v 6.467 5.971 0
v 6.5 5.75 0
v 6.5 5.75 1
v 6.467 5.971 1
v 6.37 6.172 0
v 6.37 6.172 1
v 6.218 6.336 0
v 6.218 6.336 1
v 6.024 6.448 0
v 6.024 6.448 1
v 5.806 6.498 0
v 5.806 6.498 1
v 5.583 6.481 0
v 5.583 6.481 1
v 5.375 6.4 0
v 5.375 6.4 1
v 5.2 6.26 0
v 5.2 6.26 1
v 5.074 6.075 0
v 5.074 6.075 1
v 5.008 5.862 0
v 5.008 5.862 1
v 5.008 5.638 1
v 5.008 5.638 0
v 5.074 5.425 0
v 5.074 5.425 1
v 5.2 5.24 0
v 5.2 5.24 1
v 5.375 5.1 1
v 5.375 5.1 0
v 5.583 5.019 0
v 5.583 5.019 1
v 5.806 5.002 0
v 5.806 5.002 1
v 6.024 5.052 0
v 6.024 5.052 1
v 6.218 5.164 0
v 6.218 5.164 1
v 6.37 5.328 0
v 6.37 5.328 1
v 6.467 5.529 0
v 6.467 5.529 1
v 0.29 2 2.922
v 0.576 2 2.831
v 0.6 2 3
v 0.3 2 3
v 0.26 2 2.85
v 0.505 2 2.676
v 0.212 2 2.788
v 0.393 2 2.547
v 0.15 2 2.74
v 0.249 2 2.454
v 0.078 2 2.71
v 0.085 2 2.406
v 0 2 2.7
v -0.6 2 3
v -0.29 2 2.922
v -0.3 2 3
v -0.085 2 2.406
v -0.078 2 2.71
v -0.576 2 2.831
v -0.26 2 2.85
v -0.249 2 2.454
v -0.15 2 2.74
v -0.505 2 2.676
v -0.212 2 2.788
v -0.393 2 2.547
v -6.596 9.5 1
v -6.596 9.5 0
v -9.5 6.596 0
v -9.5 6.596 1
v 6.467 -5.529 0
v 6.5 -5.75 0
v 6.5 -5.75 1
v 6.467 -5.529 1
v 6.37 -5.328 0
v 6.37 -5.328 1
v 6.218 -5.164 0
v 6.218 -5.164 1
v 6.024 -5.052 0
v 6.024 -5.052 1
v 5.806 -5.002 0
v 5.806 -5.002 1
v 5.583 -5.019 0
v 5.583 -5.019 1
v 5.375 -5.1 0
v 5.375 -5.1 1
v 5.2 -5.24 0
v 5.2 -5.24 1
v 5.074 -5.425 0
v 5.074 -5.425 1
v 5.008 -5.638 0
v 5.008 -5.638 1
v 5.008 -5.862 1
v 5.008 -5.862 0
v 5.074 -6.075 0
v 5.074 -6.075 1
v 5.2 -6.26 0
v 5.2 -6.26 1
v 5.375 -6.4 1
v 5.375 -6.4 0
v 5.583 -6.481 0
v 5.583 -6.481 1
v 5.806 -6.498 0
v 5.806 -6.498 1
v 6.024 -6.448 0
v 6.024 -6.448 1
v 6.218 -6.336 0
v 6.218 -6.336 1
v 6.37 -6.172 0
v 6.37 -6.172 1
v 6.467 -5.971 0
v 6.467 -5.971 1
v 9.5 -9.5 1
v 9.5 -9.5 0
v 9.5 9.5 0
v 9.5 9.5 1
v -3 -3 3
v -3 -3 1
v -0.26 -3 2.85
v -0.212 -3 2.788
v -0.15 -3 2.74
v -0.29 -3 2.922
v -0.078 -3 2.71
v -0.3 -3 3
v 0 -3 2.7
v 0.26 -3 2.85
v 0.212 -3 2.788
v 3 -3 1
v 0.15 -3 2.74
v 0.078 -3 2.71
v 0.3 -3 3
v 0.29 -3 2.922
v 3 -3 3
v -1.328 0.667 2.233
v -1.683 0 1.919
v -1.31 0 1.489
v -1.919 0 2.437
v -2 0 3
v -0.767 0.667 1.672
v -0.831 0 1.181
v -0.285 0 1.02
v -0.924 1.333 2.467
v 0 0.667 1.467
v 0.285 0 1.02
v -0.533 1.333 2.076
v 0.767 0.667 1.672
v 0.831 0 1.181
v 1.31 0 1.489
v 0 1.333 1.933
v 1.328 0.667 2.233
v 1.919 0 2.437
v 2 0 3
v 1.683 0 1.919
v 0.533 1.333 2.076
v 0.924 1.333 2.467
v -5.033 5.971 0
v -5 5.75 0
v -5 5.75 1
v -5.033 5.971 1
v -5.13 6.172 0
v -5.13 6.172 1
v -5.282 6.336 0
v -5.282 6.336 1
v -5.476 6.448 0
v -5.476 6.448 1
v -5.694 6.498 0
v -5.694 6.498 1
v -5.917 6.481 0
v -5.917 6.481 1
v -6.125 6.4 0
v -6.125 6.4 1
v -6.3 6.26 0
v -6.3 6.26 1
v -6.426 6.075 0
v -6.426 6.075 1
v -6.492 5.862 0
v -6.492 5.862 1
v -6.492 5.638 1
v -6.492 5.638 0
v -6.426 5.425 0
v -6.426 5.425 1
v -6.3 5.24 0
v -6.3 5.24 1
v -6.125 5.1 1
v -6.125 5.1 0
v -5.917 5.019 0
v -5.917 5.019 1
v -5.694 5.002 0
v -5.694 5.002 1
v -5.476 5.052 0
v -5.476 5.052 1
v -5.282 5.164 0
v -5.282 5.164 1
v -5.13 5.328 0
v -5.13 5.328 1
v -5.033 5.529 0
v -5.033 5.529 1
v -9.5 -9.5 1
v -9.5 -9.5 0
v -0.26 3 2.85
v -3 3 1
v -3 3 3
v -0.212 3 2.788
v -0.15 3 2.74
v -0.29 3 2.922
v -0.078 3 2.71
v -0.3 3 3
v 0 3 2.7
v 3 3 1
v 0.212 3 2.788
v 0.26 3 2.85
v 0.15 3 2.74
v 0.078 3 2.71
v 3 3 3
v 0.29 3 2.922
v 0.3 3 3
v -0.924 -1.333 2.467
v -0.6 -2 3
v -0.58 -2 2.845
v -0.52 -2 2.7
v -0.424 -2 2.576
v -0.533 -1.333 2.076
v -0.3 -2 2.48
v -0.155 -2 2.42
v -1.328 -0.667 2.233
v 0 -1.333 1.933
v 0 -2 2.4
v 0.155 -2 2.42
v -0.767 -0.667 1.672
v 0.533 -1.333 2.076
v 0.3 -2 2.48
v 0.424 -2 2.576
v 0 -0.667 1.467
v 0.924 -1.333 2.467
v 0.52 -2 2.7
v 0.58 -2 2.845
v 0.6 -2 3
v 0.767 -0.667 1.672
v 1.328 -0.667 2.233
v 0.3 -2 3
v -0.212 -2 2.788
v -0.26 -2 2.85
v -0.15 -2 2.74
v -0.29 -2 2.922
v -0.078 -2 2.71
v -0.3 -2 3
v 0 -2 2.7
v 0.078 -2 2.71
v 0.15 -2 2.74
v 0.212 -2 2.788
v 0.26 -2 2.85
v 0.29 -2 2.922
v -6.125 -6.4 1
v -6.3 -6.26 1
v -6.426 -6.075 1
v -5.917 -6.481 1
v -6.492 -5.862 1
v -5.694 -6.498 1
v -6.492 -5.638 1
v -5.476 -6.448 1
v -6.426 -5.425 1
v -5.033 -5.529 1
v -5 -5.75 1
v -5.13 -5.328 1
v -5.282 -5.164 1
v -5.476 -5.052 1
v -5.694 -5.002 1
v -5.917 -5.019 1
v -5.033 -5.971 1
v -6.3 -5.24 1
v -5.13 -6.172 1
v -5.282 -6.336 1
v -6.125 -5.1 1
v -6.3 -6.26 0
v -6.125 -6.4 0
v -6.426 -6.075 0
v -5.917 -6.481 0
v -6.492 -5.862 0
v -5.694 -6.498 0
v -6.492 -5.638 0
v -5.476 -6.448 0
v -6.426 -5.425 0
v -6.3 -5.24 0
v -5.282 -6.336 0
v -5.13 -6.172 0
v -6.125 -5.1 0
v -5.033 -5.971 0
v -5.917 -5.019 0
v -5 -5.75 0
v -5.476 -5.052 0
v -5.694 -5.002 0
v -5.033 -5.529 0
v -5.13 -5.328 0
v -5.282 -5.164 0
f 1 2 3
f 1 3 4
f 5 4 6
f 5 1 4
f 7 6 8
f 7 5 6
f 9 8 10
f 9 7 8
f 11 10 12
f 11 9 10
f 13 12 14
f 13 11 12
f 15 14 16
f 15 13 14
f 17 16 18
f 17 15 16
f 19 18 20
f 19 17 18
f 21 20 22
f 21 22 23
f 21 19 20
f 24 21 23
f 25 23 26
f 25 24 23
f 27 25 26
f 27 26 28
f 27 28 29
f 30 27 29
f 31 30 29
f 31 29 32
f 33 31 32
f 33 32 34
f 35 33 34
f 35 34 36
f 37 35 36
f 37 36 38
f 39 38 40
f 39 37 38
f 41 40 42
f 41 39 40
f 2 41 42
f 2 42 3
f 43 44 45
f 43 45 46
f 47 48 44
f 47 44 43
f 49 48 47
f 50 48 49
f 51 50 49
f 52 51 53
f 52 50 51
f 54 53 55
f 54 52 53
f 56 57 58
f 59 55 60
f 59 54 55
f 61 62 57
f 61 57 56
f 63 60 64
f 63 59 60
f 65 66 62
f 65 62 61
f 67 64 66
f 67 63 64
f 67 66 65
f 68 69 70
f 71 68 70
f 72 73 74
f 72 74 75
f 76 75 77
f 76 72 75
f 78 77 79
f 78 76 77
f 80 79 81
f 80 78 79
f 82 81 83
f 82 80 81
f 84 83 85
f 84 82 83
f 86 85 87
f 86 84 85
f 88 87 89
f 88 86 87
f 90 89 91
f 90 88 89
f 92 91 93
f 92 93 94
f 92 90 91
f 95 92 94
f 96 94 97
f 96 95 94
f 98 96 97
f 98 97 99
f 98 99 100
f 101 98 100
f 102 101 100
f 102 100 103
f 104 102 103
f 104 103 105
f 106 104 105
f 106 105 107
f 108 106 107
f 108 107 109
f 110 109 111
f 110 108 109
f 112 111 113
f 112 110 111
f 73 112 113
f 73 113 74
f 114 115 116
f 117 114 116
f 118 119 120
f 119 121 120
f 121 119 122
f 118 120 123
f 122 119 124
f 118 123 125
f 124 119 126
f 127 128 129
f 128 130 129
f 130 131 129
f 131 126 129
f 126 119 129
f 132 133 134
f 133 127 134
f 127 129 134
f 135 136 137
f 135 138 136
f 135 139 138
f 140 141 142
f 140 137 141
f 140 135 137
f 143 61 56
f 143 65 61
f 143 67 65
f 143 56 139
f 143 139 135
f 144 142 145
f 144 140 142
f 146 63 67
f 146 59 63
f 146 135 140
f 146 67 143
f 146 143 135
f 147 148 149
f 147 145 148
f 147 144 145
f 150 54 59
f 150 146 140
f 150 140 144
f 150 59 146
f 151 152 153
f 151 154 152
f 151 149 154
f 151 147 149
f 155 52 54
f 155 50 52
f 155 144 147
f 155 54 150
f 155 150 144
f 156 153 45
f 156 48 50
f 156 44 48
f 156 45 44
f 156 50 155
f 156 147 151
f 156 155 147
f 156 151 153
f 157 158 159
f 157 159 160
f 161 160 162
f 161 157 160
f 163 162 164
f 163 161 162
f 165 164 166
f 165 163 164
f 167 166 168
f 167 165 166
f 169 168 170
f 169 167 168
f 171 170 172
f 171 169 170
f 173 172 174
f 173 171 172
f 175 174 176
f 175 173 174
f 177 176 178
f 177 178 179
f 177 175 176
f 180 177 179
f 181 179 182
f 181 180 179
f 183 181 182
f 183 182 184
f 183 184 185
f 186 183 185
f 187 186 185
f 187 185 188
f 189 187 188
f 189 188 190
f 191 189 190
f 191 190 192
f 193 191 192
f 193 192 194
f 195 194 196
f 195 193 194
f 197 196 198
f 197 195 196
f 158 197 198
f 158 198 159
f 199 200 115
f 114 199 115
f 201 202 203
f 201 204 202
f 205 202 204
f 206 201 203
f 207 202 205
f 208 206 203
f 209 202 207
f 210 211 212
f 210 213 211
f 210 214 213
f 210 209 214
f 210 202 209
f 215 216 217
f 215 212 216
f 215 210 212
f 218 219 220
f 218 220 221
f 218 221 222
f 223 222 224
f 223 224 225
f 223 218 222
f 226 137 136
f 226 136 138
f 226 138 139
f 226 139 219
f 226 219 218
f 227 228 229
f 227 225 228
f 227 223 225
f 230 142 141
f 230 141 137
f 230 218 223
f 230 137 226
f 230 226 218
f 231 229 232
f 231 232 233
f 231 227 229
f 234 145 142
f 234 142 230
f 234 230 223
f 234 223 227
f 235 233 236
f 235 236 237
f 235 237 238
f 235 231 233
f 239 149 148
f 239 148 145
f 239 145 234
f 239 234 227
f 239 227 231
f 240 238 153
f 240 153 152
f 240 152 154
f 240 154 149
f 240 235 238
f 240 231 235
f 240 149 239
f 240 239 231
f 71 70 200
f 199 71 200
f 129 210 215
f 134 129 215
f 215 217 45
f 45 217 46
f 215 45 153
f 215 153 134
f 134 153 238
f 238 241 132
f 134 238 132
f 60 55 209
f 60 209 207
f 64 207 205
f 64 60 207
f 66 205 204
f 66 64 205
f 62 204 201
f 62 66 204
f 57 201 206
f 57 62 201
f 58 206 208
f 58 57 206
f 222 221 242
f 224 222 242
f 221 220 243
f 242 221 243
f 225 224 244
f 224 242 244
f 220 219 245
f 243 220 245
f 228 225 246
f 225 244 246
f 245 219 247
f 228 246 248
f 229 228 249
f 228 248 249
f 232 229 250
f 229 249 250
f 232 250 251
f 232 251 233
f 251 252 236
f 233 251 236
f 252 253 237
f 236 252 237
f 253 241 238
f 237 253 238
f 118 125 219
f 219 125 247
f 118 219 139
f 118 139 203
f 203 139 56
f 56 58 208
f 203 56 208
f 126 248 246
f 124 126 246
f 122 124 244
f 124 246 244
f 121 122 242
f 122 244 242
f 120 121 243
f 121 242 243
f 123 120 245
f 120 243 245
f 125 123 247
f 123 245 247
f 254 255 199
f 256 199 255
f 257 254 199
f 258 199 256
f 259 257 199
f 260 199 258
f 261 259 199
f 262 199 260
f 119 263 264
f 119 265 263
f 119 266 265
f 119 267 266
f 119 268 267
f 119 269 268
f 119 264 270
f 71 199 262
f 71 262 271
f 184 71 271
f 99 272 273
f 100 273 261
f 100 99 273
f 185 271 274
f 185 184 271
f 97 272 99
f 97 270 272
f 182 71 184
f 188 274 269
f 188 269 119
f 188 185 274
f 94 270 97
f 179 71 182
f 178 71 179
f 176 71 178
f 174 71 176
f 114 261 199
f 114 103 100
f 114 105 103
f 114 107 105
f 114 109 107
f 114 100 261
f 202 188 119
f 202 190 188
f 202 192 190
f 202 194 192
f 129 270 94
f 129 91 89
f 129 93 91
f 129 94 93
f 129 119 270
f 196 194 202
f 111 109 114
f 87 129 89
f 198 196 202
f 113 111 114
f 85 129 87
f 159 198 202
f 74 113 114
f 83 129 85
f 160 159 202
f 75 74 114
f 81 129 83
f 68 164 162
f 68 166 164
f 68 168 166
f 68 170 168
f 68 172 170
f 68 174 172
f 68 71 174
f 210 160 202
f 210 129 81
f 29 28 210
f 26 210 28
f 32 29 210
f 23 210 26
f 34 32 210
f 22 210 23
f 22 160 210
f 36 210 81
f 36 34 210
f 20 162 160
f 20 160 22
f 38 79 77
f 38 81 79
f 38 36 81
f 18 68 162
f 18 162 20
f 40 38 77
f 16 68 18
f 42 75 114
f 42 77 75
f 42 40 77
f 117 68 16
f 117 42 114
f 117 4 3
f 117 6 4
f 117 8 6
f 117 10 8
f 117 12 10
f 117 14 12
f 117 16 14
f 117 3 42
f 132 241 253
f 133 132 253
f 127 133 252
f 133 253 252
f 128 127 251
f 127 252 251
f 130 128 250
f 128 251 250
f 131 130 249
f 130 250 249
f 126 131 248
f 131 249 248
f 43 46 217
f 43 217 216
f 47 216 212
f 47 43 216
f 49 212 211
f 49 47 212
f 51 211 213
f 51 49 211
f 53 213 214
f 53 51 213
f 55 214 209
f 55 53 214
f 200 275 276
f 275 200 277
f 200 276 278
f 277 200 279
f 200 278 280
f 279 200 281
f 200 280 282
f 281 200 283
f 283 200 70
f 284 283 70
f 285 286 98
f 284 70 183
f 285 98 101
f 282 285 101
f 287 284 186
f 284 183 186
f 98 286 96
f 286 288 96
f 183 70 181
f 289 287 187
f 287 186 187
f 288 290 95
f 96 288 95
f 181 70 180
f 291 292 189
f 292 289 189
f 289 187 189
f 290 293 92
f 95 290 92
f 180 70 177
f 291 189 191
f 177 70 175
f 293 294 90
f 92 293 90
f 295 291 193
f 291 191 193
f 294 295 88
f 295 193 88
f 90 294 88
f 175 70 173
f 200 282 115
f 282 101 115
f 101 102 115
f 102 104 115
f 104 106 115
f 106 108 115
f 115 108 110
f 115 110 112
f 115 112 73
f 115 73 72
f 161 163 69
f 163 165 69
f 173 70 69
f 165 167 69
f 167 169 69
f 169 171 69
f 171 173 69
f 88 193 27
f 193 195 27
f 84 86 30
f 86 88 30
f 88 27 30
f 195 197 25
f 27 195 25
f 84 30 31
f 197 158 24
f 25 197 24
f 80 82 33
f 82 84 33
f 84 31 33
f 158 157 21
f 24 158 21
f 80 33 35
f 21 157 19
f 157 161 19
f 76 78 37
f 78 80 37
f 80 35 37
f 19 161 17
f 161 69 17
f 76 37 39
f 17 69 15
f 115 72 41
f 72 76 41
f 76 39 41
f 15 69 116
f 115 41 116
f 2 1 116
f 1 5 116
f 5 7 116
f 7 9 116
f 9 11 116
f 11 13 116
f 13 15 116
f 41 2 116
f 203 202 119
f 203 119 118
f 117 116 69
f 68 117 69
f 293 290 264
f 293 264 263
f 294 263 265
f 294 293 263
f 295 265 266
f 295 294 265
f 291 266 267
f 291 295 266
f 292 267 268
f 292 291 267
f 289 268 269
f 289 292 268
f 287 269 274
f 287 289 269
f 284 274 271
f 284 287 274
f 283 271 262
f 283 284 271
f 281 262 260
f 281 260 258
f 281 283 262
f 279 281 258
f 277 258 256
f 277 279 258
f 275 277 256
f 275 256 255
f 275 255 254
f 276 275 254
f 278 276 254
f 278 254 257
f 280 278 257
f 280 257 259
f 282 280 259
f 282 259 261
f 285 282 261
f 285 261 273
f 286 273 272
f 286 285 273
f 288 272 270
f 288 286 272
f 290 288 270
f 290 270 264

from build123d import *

# Parameters (mm, degrees)
F2_DEPTH  = 3
F0_W      = 0.3
F0_H      = 4
F3_DEPTH  = 3
F4_DEPTH  = 3
F7_DEPTH  = 3
F8_DEPTH  = 2
F9_DEPTH  = 1
F11_DEPTH = 3
F12_DEPTH = 2
F13_DEPTH = 1
F15_DEPTH = 1
F16_DEPTH = 1
F0_R      = 0.75
F17_DEPTH = 1


with BuildPart() as f2:
    # F0 (on Top) → F2 (new body)
    with BuildSketch(Plane.XY):
        Polygon((-0.6, -2), (-2, 0), (-2, -2), align=None)
    extrude(amount=F2_DEPTH)


with BuildPart() as f2b:
    # F0 (on Top) → F2, piece 2 (new body)
    with BuildSketch(Plane.XY):
        Polygon((-0.6, 2), (-2, 2), (-2, 0), align=None)
    extrude(amount=F2_DEPTH)


with BuildPart() as f2c:
    # F0 (on Top) → F2, piece 3 (new body)
    with BuildSketch(Plane.XY):
        Polygon((2, 2), (0.6, 2), (2, 0), align=None)
    extrude(amount=F2_DEPTH)


with BuildPart() as f2d:
    # F0 (on Top) → F2, piece 4 (new body)
    with BuildSketch(Plane.XY):
        Polygon((2, -2), (2, 0), (0.6, -2), align=None)
    extrude(amount=F2_DEPTH)


with BuildPart() as f3:
    # F0 (on Top) → F3 (new body)
    with BuildSketch(Plane.XY):
        Polygon((-0.6, -2), (-0.6, 2), (-2, 0), align=None)
        with Locations((-0.45, 0)):
            Rectangle(F0_W, F0_H)
        with Locations((-0.15, 0)):
            Rectangle(F0_W, F0_H)
    extrude(amount=F3_DEPTH)


with BuildPart() as f4:
    # F0 (on Top) → F4 (new body)
    with BuildSketch(Plane.XY):
        with Locations((0.45, 0)):
            Rectangle(F0_W, F0_H)
        Polygon((2, 0), (0.6, 2), (0.6, -2), align=None)
        with Locations((0.15, 0)):
            Rectangle(F0_W, F0_H)
    extrude(amount=F4_DEPTH)


with BuildPart() as f5_tool:
    # F4_face (on face) → F5 (revolve)
    with BuildSketch(Plane(origin=(0.7128205128, 0, 3), x_dir=(1, 0, 0), z_dir=(0, 0, 1))):
        Polygon((-0.1128205128, -2), (1.2871794872, 0), (-0.1128205128, 2), (-0.7128205128, 2), (-0.7128205128, -2), align=None)
    revolve(axis=Axis((0, 0, 3), (0, -1, 0)))


with BuildPart() as f3_1:
    add(f3.part)

    # F5: cut by f5_tool
    add(f5_tool.part, mode=Mode.SUBTRACT)


with BuildPart() as f4_1:
    add(f4.part)

    # F5: cut by f5_tool
    add(f5_tool.part, mode=Mode.SUBTRACT)


with BuildPart() as f2b_1:
    add(f2b.part)

    # F6: union F2, F3, F4, F2c, F2d
    add(f2.part)
    add(f3_1.part)
    add(f4_1.part)
    add(f2c.part)
    add(f2d.part)


with BuildPart() as f7:
    # F1 (on Front) → F7 (new body)
    with BuildSketch(Plane.XZ):
        with BuildLine():
            ThreePointArc((-0.6, 3), (-0.4242640687, 2.5757359313), (0, 2.4))
            Line((0, 2.4), (0, 2.7))
            ThreePointArc((0, 2.7), (-0.2121320344, 2.7878679656), (-0.3, 3))
            Line((-0.3, 3), (-0.6, 3))
        make_face()
        with BuildLine():
            Line((0, 2.7), (0, 2.4))
            ThreePointArc((0, 2.4), (0.4242640687, 2.5757359313), (0.6, 3))
            Line((0.6, 3), (0.3, 3))
            ThreePointArc((0.3, 3), (0.2121320344, 2.7878679656), (0, 2.7))
        make_face()
    extrude(amount=F7_DEPTH)

    # F1 (on Front) → F8 (cut)
    with BuildSketch(Plane.XZ):
        with BuildLine():
            ThreePointArc((-0.6, 3), (-0.4242640687, 2.5757359313), (0, 2.4))
            Line((0, 2.4), (0, 2.7))
            ThreePointArc((0, 2.7), (-0.2121320344, 2.7878679656), (-0.3, 3))
            Line((-0.3, 3), (-0.6, 3))
        make_face()
        with BuildLine():
            Line((0, 2.7), (0, 2.4))
            ThreePointArc((0, 2.4), (0.4242640687, 2.5757359313), (0.6, 3))
            Line((0.6, 3), (0.3, 3))
            ThreePointArc((0.3, 3), (0.2121320344, 2.7878679656), (0, 2.7))
        make_face()
    extrude(amount=F8_DEPTH, mode=Mode.SUBTRACT)


with BuildPart() as f9:
    # F9 (new): a face of the model
    f9_faces = [f2b_1.part.faces().sort_by_distance(p)[0] for p in [
        (0, -2, 1.4384118942),
    ]]
    extrude(f9_faces, amount=F9_DEPTH)


with BuildPart() as f7_1:
    add(f7.part)

    # F10: union F2b, F9
    add(f2b_1.part)
    add(f9.part)


with BuildPart() as f11:
    # F1 (on Front) → F11 (new body)
    with BuildSketch(Plane.XZ):
        with BuildLine():
            Line((0, 2.7), (0, 2.4))
            ThreePointArc((0, 2.4), (0.4242640687, 2.5757359313), (0.6, 3))
            Line((0.6, 3), (0.3, 3))
            ThreePointArc((0.3, 3), (0.2121320344, 2.7878679656), (0, 2.7))
        make_face()
        with BuildLine():
            ThreePointArc((-0.6, 3), (-0.4242640687, 2.5757359313), (0, 2.4))
            Line((0, 2.4), (0, 2.7))
            ThreePointArc((0, 2.7), (-0.2121320344, 2.7878679656), (-0.3, 3))
            Line((-0.3, 3), (-0.6, 3))
        make_face()
    extrude(amount=-F11_DEPTH)

    # F1 (on Front) → F12 (cut)
    with BuildSketch(Plane.XZ):
        with BuildLine():
            Line((0, 2.7), (0, 2.4))
            ThreePointArc((0, 2.4), (0.4242640687, 2.5757359313), (0.6, 3))
            Line((0.6, 3), (0.3, 3))
            ThreePointArc((0.3, 3), (0.2121320344, 2.7878679656), (0, 2.7))
        make_face()
        with BuildLine():
            ThreePointArc((-0.6, 3), (-0.4242640687, 2.5757359313), (0, 2.4))
            Line((0, 2.4), (0, 2.7))
            ThreePointArc((0, 2.7), (-0.2121320344, 2.7878679656), (-0.3, 3))
            Line((-0.3, 3), (-0.6, 3))
        make_face()
    extrude(amount=-F12_DEPTH, mode=Mode.SUBTRACT)


with BuildPart() as f13:
    # F13 (new): a face of the model
    f13_faces = [f7_1.part.faces().sort_by_distance(p)[0] for p in [
        (0, 2, 1.4384118942),
    ]]
    extrude(f13_faces, amount=F13_DEPTH)


with BuildPart() as f11_1:
    add(f11.part)

    # F14: union F13, F7
    add(f13.part)
    add(f7_1.part)

    # F15 (add): a face of the model
    f15_faces = [f11_1.faces().sort_by_distance(p)[0] for p in [
        (2, 0, 1.5),
    ]]
    extrude(f15_faces, amount=F15_DEPTH)

    # F16 (add): a face of the model
    f16_faces = [f11_1.faces().sort_by_distance(p)[0] for p in [
        (-2, 0, 1.5),
    ]]
    extrude(f16_faces, amount=F16_DEPTH)

    # F0 (on Top) → F17 (join)
    with BuildSketch(Plane.XY):
        Polygon((9.5, 9.5), (-6.5961940777, 9.5), (-9.5, 6.5961940777), (-9.5, -9.5), (9.5, -9.5), align=None)
        with Locations((-5.75, -5.75)):
            Circle(F0_R, mode=Mode.SUBTRACT)
        with Locations((5.75, -5.75)):
            Circle(F0_R, mode=Mode.SUBTRACT)
        with Locations((-5.75, 5.75)):
            Circle(F0_R, mode=Mode.SUBTRACT)
        Polygon((-2, 0), (-2, 2), (-0.6, 2), (-0.3, 2), (0, 2), (0.3, 2), (0.6, 2), (2, 2), (2, 0), (2, -2), (0.6, -2), (0.3, -2), (0, -2), (-0.3, -2), (-0.6, -2), (-2, -2), align=None, mode=Mode.SUBTRACT)
        with Locations((5.75, 5.75)):
            Circle(F0_R, mode=Mode.SUBTRACT)
    extrude(amount=F17_DEPTH)


solid = f11_1.part
